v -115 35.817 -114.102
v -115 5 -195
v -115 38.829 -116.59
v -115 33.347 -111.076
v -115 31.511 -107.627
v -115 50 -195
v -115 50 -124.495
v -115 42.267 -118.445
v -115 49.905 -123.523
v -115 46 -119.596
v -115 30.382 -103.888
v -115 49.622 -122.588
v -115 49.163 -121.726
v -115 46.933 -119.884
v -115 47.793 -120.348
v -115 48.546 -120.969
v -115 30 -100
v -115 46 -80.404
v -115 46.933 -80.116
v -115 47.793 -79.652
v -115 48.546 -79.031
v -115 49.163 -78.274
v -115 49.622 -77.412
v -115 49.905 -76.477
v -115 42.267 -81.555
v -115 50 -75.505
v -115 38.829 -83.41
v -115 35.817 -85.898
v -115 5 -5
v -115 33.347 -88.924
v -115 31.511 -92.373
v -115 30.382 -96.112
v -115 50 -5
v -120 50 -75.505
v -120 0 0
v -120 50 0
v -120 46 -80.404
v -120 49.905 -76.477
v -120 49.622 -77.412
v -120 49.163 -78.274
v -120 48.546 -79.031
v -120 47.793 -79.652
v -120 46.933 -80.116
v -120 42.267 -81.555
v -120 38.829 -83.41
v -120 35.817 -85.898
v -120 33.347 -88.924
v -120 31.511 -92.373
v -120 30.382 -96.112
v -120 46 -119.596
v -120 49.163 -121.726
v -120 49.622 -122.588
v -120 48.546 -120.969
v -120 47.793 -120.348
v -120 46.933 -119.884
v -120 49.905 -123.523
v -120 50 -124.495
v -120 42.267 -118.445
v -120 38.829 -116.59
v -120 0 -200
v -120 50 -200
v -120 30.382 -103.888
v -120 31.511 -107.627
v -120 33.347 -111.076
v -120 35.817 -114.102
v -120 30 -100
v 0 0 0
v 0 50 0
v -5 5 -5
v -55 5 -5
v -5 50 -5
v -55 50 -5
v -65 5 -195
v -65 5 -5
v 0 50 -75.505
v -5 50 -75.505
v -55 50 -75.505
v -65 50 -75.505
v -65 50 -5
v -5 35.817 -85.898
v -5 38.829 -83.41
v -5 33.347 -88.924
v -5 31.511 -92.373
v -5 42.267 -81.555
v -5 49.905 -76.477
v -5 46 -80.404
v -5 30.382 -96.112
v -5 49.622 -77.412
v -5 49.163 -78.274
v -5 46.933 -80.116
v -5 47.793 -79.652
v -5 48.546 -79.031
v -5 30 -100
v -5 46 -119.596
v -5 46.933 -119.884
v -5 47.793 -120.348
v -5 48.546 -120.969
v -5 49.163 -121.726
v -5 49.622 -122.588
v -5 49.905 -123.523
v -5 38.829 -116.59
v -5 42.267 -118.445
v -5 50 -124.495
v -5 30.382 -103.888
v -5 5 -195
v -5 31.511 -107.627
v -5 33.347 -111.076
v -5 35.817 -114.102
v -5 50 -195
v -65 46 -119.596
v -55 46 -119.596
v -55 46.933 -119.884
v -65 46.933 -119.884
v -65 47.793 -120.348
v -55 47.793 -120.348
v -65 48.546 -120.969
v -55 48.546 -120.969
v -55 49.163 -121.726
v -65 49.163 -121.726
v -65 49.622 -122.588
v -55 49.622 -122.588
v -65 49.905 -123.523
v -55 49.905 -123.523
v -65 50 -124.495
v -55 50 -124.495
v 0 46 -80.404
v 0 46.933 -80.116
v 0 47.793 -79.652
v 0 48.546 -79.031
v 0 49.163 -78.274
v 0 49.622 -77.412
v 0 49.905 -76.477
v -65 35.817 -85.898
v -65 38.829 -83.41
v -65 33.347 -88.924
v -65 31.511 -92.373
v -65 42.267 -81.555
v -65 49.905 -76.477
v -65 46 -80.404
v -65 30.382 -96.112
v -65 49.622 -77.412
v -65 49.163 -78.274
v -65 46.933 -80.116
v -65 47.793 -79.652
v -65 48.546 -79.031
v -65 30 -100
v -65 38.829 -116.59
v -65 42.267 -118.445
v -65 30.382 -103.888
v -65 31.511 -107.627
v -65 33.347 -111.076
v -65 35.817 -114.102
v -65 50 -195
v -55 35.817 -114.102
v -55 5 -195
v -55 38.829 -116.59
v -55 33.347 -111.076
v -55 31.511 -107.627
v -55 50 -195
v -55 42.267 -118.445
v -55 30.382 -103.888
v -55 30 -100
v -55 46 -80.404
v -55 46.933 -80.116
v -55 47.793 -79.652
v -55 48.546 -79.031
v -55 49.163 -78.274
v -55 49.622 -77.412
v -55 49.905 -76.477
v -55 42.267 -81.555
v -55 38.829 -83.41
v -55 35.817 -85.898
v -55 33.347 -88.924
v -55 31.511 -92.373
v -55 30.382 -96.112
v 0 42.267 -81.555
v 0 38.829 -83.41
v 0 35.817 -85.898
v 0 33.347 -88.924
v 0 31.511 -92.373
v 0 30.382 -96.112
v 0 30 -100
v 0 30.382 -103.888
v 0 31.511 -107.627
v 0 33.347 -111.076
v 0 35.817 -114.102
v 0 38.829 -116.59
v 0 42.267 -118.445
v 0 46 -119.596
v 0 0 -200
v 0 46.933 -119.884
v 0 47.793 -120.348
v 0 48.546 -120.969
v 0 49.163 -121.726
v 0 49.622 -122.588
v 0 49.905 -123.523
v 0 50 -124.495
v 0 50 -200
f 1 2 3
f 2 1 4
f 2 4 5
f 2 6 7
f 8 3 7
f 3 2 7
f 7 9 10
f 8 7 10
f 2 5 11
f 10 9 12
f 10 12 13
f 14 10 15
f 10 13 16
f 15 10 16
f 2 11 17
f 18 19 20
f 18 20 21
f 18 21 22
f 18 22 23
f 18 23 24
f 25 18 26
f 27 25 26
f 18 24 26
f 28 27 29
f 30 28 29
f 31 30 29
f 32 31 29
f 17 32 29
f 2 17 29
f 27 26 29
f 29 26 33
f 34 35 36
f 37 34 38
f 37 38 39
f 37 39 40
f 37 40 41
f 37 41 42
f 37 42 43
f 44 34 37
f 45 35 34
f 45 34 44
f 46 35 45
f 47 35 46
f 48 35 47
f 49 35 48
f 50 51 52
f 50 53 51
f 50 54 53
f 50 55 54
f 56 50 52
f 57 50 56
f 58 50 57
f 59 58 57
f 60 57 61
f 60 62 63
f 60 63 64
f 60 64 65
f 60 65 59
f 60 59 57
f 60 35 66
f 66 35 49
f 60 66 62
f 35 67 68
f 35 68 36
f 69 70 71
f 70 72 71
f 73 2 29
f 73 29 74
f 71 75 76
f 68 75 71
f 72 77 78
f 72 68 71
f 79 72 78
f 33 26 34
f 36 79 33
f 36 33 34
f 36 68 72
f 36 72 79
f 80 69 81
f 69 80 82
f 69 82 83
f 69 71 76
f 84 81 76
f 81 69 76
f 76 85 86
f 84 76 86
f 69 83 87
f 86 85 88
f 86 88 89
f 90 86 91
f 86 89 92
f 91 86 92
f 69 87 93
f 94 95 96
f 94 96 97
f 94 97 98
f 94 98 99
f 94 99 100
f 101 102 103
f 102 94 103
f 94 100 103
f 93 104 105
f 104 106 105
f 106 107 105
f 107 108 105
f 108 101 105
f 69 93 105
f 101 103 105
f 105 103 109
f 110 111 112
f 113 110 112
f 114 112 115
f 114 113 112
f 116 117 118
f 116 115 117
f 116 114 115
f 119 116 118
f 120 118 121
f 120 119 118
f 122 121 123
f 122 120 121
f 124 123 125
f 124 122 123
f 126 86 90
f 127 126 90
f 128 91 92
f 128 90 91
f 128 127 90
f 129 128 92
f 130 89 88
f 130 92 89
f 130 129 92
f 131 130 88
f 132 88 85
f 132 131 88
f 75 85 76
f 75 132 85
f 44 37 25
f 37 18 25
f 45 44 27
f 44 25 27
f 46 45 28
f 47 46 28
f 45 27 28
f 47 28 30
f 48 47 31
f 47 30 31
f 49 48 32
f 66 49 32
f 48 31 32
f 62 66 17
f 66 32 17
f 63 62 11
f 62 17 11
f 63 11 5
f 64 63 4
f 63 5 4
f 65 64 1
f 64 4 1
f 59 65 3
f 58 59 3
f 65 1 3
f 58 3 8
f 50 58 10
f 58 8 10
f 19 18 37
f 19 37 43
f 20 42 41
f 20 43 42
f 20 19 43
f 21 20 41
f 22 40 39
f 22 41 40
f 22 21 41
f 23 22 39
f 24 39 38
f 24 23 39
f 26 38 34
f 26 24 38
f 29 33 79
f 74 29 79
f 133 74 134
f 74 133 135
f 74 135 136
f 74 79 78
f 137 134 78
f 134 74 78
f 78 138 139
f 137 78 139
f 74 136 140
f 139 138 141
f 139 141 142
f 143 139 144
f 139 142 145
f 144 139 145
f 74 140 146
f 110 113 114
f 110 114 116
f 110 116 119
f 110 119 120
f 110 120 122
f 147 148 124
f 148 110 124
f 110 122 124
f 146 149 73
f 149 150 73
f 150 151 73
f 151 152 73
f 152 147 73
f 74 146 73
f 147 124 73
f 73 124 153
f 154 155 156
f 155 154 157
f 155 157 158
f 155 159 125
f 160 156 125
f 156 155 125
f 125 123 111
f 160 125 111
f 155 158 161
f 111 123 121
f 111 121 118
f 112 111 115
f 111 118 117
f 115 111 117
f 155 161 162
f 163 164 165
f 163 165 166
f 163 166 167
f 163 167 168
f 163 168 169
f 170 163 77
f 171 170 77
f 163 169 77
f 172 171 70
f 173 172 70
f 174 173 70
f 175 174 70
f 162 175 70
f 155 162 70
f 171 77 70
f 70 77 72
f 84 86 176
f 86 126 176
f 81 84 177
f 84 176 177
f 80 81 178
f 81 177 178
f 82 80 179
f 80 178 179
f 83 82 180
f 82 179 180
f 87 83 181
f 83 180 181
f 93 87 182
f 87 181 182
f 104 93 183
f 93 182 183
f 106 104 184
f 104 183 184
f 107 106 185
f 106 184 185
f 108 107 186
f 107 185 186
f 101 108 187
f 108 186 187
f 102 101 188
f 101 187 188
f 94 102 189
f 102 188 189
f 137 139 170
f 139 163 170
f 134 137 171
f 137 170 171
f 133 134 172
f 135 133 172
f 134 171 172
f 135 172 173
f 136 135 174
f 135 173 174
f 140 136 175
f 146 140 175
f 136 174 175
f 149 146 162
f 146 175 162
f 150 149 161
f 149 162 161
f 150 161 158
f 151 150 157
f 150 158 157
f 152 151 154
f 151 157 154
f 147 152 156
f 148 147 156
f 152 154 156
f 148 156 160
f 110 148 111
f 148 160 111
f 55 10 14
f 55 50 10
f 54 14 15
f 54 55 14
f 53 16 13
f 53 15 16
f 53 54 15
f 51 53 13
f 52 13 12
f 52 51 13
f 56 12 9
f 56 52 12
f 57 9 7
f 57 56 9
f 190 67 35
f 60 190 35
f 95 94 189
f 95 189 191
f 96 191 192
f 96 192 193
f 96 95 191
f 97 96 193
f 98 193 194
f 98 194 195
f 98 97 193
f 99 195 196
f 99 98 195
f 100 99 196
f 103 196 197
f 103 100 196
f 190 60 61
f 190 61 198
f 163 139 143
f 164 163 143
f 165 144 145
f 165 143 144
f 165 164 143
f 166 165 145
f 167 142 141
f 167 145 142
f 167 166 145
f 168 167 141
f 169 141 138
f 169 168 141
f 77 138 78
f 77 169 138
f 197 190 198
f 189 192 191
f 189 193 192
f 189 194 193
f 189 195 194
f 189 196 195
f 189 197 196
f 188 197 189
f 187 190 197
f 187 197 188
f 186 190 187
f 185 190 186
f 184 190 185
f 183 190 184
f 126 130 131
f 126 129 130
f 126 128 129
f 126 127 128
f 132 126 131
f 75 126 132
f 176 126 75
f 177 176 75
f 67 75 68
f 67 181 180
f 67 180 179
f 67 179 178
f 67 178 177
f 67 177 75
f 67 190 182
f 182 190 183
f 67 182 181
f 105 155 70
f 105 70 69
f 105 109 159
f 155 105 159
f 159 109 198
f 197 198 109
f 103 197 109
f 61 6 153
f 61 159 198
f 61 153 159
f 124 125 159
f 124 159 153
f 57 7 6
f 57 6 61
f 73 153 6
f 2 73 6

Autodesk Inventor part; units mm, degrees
ref_plane "YZ Plane" through (0, 0, 0) normal (1, 0, 0) x (0, 1, 0)
ref_plane "XZ Plane" through (0, 0, 0) normal (0, 1, 0) x (-1, 0, 0)
ref_plane "XY Plane" through (0, 0, 0) normal (0, 0, 1) x (1, 0, 0)
sketch "Sketch1" plane through (0, 0, 0) normal (0, 1, 0) x (-1, 0, 0)
  line L0 (0, 0) -> (120, 0)
  line L1 (120, 0) -> (120, -200)
  line L2 (120, -200) -> (0, -200)
  line L3 (0, -200) -> (0, 0)
  dimension "d0" = 120
  dimension "d1" = 200
extrude "Extrusion1" add sketch "Sketch1" along normal blind 50
sketch "Sketch2" plane through (0, 50, 0) normal (0, 1, 0) x (1, 0, 0)
  line L0 (-5, 5) -> (-5, 195)
  line L1 (0, 200) -> (-120, 200) projected
  line L2 (-5, 195) -> (-55, 195)
  line L3 (-55, 195) -> (-55, 5)
  line L4 (-55, 5) -> (-5, 5)
  line L5 (-115, 5) -> (-65, 5)
  line L6 (-65, 5) -> (-65, 195)
  line L7 (-65, 195) -> (-115, 195)
  line L8 (-115, 195) -> (-115, 5)
  point P0 (0, 0)
  dimension "d4" = 190
  dimension "d5" = 50
  dimension "d6" = 50
  dimension "d7" = 190
extrude "Extrusion2" cut sketch "Sketch2" against normal blind 45
sketch "Sketch4" plane through (0, 0, 0) normal (1, 0, 0) x (0, 0, -1)
  line L0 (5, 50) -> (195, 50) projected
  circle A0 centre (100, 50) radius 20
  point P0 (0, 0)
  dimension "d10" = 40
extrude "Extrusion3" cut sketch "Sketch4" against normal blind 120
fillet "Fillet1" radius 5 6 edges at (-117.5, 50, -120) (-117.5, 50, -80) (-60, 50, -120) (-60, 50, -80) (-2.5, 50, -120) (-2.5, 50, -80)
properties part number "Box"
